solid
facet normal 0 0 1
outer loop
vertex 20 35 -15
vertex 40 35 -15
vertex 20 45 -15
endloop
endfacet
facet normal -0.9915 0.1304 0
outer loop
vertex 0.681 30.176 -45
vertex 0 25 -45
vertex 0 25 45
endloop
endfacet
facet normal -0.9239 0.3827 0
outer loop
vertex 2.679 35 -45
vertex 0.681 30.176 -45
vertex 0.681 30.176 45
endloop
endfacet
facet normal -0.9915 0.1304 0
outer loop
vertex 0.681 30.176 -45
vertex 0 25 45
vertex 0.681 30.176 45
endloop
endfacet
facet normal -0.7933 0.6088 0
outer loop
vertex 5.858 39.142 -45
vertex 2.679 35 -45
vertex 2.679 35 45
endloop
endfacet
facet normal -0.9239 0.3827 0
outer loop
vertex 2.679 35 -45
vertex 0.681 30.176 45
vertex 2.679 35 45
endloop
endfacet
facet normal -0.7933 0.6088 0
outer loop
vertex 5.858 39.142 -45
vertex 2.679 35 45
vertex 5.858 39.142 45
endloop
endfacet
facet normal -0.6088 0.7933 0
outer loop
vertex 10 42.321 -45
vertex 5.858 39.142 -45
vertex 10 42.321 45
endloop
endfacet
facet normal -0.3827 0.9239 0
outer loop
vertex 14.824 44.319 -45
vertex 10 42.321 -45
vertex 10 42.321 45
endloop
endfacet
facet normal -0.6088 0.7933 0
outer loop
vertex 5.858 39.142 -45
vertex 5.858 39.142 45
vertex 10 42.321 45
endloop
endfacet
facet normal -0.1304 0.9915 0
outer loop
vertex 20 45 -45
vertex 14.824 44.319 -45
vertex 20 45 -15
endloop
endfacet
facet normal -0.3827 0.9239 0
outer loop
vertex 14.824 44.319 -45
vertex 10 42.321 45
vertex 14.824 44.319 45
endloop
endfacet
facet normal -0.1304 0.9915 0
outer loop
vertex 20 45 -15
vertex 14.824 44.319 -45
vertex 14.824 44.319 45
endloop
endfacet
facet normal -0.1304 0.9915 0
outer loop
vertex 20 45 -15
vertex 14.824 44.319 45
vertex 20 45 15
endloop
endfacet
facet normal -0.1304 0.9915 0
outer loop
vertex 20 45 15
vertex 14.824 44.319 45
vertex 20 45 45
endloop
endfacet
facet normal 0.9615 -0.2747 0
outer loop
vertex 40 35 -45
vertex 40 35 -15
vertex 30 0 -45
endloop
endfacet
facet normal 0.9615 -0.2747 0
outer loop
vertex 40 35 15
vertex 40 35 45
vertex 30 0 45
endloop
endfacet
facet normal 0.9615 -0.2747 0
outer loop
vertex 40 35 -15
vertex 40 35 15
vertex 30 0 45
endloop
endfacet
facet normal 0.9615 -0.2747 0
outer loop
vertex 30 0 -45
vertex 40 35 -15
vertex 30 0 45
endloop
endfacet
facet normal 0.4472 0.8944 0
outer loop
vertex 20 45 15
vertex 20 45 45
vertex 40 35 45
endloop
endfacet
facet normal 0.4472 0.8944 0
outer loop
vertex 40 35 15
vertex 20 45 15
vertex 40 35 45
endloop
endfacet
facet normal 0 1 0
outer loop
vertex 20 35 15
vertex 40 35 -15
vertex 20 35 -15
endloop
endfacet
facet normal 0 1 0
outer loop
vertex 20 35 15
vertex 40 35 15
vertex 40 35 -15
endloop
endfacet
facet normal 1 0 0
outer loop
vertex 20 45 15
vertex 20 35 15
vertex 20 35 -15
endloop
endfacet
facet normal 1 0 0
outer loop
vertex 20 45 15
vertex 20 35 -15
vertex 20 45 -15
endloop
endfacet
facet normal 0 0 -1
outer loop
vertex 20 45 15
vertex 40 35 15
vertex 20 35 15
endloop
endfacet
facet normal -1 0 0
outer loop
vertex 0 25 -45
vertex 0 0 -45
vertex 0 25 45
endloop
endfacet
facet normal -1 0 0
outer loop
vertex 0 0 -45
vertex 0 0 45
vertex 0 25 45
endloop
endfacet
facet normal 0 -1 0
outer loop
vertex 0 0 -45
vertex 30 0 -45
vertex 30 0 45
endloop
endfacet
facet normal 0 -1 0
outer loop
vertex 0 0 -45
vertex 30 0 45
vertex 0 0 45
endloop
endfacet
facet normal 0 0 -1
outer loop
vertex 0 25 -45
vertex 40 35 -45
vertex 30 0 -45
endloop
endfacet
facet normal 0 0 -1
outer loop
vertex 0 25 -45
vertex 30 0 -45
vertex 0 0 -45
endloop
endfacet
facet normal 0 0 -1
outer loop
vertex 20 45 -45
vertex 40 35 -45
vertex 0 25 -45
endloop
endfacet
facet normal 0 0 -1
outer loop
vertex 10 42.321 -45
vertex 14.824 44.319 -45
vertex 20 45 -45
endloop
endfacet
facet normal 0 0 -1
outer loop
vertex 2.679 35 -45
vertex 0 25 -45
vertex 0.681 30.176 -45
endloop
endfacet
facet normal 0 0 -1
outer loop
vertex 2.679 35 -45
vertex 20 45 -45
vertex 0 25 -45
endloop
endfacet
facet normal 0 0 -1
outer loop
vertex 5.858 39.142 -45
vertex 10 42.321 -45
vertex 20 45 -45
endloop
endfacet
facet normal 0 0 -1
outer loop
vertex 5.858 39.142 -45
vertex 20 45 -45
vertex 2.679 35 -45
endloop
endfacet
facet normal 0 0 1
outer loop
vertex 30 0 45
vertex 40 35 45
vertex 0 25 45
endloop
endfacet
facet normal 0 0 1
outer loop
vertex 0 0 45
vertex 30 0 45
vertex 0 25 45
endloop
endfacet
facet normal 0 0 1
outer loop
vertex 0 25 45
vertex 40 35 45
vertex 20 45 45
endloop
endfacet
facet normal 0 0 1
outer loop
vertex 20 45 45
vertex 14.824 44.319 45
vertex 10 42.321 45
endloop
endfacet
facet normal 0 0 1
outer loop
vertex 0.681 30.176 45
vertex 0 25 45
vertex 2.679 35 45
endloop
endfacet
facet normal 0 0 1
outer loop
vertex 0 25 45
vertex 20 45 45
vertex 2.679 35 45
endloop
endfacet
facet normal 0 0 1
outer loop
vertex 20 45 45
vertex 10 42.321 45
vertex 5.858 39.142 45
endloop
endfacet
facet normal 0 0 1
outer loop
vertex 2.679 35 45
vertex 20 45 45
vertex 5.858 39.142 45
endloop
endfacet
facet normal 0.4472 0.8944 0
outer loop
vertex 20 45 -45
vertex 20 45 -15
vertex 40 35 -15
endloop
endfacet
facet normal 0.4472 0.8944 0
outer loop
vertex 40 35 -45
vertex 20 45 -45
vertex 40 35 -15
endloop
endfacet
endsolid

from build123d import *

# Parameters (mm, degrees)
BOSS_EXTRUDE1_DEPTH = 45
CUT_EXTRUDE1_DEPTH  = 15


with BuildPart() as part:
    # Sketch1 → Boss-Extrude1 (new, symmetric)
    with BuildSketch(Plane.XY):
        with BuildLine():
            Line((40, 35), (20, 45))
            ThreePointArc((20, 45), (5.857864376, 39.142135624), (0, 25))
            Line((0, 25), (0, 0))
            Line((0, 0), (30, 0))
            Line((30, 0), (40, 35))
        make_face()
    extrude(amount=BOSS_EXTRUDE1_DEPTH, both=True)

    # Sketch1<3> → Cut-Extrude1 (cut, symmetric)
    with BuildSketch(Plane.XY):
        Polygon((40, 35), (20, 45), (20, 35), align=None)
    extrude(amount=CUT_EXTRUDE1_DEPTH, both=True, mode=Mode.SUBTRACT)


solid = part.part
